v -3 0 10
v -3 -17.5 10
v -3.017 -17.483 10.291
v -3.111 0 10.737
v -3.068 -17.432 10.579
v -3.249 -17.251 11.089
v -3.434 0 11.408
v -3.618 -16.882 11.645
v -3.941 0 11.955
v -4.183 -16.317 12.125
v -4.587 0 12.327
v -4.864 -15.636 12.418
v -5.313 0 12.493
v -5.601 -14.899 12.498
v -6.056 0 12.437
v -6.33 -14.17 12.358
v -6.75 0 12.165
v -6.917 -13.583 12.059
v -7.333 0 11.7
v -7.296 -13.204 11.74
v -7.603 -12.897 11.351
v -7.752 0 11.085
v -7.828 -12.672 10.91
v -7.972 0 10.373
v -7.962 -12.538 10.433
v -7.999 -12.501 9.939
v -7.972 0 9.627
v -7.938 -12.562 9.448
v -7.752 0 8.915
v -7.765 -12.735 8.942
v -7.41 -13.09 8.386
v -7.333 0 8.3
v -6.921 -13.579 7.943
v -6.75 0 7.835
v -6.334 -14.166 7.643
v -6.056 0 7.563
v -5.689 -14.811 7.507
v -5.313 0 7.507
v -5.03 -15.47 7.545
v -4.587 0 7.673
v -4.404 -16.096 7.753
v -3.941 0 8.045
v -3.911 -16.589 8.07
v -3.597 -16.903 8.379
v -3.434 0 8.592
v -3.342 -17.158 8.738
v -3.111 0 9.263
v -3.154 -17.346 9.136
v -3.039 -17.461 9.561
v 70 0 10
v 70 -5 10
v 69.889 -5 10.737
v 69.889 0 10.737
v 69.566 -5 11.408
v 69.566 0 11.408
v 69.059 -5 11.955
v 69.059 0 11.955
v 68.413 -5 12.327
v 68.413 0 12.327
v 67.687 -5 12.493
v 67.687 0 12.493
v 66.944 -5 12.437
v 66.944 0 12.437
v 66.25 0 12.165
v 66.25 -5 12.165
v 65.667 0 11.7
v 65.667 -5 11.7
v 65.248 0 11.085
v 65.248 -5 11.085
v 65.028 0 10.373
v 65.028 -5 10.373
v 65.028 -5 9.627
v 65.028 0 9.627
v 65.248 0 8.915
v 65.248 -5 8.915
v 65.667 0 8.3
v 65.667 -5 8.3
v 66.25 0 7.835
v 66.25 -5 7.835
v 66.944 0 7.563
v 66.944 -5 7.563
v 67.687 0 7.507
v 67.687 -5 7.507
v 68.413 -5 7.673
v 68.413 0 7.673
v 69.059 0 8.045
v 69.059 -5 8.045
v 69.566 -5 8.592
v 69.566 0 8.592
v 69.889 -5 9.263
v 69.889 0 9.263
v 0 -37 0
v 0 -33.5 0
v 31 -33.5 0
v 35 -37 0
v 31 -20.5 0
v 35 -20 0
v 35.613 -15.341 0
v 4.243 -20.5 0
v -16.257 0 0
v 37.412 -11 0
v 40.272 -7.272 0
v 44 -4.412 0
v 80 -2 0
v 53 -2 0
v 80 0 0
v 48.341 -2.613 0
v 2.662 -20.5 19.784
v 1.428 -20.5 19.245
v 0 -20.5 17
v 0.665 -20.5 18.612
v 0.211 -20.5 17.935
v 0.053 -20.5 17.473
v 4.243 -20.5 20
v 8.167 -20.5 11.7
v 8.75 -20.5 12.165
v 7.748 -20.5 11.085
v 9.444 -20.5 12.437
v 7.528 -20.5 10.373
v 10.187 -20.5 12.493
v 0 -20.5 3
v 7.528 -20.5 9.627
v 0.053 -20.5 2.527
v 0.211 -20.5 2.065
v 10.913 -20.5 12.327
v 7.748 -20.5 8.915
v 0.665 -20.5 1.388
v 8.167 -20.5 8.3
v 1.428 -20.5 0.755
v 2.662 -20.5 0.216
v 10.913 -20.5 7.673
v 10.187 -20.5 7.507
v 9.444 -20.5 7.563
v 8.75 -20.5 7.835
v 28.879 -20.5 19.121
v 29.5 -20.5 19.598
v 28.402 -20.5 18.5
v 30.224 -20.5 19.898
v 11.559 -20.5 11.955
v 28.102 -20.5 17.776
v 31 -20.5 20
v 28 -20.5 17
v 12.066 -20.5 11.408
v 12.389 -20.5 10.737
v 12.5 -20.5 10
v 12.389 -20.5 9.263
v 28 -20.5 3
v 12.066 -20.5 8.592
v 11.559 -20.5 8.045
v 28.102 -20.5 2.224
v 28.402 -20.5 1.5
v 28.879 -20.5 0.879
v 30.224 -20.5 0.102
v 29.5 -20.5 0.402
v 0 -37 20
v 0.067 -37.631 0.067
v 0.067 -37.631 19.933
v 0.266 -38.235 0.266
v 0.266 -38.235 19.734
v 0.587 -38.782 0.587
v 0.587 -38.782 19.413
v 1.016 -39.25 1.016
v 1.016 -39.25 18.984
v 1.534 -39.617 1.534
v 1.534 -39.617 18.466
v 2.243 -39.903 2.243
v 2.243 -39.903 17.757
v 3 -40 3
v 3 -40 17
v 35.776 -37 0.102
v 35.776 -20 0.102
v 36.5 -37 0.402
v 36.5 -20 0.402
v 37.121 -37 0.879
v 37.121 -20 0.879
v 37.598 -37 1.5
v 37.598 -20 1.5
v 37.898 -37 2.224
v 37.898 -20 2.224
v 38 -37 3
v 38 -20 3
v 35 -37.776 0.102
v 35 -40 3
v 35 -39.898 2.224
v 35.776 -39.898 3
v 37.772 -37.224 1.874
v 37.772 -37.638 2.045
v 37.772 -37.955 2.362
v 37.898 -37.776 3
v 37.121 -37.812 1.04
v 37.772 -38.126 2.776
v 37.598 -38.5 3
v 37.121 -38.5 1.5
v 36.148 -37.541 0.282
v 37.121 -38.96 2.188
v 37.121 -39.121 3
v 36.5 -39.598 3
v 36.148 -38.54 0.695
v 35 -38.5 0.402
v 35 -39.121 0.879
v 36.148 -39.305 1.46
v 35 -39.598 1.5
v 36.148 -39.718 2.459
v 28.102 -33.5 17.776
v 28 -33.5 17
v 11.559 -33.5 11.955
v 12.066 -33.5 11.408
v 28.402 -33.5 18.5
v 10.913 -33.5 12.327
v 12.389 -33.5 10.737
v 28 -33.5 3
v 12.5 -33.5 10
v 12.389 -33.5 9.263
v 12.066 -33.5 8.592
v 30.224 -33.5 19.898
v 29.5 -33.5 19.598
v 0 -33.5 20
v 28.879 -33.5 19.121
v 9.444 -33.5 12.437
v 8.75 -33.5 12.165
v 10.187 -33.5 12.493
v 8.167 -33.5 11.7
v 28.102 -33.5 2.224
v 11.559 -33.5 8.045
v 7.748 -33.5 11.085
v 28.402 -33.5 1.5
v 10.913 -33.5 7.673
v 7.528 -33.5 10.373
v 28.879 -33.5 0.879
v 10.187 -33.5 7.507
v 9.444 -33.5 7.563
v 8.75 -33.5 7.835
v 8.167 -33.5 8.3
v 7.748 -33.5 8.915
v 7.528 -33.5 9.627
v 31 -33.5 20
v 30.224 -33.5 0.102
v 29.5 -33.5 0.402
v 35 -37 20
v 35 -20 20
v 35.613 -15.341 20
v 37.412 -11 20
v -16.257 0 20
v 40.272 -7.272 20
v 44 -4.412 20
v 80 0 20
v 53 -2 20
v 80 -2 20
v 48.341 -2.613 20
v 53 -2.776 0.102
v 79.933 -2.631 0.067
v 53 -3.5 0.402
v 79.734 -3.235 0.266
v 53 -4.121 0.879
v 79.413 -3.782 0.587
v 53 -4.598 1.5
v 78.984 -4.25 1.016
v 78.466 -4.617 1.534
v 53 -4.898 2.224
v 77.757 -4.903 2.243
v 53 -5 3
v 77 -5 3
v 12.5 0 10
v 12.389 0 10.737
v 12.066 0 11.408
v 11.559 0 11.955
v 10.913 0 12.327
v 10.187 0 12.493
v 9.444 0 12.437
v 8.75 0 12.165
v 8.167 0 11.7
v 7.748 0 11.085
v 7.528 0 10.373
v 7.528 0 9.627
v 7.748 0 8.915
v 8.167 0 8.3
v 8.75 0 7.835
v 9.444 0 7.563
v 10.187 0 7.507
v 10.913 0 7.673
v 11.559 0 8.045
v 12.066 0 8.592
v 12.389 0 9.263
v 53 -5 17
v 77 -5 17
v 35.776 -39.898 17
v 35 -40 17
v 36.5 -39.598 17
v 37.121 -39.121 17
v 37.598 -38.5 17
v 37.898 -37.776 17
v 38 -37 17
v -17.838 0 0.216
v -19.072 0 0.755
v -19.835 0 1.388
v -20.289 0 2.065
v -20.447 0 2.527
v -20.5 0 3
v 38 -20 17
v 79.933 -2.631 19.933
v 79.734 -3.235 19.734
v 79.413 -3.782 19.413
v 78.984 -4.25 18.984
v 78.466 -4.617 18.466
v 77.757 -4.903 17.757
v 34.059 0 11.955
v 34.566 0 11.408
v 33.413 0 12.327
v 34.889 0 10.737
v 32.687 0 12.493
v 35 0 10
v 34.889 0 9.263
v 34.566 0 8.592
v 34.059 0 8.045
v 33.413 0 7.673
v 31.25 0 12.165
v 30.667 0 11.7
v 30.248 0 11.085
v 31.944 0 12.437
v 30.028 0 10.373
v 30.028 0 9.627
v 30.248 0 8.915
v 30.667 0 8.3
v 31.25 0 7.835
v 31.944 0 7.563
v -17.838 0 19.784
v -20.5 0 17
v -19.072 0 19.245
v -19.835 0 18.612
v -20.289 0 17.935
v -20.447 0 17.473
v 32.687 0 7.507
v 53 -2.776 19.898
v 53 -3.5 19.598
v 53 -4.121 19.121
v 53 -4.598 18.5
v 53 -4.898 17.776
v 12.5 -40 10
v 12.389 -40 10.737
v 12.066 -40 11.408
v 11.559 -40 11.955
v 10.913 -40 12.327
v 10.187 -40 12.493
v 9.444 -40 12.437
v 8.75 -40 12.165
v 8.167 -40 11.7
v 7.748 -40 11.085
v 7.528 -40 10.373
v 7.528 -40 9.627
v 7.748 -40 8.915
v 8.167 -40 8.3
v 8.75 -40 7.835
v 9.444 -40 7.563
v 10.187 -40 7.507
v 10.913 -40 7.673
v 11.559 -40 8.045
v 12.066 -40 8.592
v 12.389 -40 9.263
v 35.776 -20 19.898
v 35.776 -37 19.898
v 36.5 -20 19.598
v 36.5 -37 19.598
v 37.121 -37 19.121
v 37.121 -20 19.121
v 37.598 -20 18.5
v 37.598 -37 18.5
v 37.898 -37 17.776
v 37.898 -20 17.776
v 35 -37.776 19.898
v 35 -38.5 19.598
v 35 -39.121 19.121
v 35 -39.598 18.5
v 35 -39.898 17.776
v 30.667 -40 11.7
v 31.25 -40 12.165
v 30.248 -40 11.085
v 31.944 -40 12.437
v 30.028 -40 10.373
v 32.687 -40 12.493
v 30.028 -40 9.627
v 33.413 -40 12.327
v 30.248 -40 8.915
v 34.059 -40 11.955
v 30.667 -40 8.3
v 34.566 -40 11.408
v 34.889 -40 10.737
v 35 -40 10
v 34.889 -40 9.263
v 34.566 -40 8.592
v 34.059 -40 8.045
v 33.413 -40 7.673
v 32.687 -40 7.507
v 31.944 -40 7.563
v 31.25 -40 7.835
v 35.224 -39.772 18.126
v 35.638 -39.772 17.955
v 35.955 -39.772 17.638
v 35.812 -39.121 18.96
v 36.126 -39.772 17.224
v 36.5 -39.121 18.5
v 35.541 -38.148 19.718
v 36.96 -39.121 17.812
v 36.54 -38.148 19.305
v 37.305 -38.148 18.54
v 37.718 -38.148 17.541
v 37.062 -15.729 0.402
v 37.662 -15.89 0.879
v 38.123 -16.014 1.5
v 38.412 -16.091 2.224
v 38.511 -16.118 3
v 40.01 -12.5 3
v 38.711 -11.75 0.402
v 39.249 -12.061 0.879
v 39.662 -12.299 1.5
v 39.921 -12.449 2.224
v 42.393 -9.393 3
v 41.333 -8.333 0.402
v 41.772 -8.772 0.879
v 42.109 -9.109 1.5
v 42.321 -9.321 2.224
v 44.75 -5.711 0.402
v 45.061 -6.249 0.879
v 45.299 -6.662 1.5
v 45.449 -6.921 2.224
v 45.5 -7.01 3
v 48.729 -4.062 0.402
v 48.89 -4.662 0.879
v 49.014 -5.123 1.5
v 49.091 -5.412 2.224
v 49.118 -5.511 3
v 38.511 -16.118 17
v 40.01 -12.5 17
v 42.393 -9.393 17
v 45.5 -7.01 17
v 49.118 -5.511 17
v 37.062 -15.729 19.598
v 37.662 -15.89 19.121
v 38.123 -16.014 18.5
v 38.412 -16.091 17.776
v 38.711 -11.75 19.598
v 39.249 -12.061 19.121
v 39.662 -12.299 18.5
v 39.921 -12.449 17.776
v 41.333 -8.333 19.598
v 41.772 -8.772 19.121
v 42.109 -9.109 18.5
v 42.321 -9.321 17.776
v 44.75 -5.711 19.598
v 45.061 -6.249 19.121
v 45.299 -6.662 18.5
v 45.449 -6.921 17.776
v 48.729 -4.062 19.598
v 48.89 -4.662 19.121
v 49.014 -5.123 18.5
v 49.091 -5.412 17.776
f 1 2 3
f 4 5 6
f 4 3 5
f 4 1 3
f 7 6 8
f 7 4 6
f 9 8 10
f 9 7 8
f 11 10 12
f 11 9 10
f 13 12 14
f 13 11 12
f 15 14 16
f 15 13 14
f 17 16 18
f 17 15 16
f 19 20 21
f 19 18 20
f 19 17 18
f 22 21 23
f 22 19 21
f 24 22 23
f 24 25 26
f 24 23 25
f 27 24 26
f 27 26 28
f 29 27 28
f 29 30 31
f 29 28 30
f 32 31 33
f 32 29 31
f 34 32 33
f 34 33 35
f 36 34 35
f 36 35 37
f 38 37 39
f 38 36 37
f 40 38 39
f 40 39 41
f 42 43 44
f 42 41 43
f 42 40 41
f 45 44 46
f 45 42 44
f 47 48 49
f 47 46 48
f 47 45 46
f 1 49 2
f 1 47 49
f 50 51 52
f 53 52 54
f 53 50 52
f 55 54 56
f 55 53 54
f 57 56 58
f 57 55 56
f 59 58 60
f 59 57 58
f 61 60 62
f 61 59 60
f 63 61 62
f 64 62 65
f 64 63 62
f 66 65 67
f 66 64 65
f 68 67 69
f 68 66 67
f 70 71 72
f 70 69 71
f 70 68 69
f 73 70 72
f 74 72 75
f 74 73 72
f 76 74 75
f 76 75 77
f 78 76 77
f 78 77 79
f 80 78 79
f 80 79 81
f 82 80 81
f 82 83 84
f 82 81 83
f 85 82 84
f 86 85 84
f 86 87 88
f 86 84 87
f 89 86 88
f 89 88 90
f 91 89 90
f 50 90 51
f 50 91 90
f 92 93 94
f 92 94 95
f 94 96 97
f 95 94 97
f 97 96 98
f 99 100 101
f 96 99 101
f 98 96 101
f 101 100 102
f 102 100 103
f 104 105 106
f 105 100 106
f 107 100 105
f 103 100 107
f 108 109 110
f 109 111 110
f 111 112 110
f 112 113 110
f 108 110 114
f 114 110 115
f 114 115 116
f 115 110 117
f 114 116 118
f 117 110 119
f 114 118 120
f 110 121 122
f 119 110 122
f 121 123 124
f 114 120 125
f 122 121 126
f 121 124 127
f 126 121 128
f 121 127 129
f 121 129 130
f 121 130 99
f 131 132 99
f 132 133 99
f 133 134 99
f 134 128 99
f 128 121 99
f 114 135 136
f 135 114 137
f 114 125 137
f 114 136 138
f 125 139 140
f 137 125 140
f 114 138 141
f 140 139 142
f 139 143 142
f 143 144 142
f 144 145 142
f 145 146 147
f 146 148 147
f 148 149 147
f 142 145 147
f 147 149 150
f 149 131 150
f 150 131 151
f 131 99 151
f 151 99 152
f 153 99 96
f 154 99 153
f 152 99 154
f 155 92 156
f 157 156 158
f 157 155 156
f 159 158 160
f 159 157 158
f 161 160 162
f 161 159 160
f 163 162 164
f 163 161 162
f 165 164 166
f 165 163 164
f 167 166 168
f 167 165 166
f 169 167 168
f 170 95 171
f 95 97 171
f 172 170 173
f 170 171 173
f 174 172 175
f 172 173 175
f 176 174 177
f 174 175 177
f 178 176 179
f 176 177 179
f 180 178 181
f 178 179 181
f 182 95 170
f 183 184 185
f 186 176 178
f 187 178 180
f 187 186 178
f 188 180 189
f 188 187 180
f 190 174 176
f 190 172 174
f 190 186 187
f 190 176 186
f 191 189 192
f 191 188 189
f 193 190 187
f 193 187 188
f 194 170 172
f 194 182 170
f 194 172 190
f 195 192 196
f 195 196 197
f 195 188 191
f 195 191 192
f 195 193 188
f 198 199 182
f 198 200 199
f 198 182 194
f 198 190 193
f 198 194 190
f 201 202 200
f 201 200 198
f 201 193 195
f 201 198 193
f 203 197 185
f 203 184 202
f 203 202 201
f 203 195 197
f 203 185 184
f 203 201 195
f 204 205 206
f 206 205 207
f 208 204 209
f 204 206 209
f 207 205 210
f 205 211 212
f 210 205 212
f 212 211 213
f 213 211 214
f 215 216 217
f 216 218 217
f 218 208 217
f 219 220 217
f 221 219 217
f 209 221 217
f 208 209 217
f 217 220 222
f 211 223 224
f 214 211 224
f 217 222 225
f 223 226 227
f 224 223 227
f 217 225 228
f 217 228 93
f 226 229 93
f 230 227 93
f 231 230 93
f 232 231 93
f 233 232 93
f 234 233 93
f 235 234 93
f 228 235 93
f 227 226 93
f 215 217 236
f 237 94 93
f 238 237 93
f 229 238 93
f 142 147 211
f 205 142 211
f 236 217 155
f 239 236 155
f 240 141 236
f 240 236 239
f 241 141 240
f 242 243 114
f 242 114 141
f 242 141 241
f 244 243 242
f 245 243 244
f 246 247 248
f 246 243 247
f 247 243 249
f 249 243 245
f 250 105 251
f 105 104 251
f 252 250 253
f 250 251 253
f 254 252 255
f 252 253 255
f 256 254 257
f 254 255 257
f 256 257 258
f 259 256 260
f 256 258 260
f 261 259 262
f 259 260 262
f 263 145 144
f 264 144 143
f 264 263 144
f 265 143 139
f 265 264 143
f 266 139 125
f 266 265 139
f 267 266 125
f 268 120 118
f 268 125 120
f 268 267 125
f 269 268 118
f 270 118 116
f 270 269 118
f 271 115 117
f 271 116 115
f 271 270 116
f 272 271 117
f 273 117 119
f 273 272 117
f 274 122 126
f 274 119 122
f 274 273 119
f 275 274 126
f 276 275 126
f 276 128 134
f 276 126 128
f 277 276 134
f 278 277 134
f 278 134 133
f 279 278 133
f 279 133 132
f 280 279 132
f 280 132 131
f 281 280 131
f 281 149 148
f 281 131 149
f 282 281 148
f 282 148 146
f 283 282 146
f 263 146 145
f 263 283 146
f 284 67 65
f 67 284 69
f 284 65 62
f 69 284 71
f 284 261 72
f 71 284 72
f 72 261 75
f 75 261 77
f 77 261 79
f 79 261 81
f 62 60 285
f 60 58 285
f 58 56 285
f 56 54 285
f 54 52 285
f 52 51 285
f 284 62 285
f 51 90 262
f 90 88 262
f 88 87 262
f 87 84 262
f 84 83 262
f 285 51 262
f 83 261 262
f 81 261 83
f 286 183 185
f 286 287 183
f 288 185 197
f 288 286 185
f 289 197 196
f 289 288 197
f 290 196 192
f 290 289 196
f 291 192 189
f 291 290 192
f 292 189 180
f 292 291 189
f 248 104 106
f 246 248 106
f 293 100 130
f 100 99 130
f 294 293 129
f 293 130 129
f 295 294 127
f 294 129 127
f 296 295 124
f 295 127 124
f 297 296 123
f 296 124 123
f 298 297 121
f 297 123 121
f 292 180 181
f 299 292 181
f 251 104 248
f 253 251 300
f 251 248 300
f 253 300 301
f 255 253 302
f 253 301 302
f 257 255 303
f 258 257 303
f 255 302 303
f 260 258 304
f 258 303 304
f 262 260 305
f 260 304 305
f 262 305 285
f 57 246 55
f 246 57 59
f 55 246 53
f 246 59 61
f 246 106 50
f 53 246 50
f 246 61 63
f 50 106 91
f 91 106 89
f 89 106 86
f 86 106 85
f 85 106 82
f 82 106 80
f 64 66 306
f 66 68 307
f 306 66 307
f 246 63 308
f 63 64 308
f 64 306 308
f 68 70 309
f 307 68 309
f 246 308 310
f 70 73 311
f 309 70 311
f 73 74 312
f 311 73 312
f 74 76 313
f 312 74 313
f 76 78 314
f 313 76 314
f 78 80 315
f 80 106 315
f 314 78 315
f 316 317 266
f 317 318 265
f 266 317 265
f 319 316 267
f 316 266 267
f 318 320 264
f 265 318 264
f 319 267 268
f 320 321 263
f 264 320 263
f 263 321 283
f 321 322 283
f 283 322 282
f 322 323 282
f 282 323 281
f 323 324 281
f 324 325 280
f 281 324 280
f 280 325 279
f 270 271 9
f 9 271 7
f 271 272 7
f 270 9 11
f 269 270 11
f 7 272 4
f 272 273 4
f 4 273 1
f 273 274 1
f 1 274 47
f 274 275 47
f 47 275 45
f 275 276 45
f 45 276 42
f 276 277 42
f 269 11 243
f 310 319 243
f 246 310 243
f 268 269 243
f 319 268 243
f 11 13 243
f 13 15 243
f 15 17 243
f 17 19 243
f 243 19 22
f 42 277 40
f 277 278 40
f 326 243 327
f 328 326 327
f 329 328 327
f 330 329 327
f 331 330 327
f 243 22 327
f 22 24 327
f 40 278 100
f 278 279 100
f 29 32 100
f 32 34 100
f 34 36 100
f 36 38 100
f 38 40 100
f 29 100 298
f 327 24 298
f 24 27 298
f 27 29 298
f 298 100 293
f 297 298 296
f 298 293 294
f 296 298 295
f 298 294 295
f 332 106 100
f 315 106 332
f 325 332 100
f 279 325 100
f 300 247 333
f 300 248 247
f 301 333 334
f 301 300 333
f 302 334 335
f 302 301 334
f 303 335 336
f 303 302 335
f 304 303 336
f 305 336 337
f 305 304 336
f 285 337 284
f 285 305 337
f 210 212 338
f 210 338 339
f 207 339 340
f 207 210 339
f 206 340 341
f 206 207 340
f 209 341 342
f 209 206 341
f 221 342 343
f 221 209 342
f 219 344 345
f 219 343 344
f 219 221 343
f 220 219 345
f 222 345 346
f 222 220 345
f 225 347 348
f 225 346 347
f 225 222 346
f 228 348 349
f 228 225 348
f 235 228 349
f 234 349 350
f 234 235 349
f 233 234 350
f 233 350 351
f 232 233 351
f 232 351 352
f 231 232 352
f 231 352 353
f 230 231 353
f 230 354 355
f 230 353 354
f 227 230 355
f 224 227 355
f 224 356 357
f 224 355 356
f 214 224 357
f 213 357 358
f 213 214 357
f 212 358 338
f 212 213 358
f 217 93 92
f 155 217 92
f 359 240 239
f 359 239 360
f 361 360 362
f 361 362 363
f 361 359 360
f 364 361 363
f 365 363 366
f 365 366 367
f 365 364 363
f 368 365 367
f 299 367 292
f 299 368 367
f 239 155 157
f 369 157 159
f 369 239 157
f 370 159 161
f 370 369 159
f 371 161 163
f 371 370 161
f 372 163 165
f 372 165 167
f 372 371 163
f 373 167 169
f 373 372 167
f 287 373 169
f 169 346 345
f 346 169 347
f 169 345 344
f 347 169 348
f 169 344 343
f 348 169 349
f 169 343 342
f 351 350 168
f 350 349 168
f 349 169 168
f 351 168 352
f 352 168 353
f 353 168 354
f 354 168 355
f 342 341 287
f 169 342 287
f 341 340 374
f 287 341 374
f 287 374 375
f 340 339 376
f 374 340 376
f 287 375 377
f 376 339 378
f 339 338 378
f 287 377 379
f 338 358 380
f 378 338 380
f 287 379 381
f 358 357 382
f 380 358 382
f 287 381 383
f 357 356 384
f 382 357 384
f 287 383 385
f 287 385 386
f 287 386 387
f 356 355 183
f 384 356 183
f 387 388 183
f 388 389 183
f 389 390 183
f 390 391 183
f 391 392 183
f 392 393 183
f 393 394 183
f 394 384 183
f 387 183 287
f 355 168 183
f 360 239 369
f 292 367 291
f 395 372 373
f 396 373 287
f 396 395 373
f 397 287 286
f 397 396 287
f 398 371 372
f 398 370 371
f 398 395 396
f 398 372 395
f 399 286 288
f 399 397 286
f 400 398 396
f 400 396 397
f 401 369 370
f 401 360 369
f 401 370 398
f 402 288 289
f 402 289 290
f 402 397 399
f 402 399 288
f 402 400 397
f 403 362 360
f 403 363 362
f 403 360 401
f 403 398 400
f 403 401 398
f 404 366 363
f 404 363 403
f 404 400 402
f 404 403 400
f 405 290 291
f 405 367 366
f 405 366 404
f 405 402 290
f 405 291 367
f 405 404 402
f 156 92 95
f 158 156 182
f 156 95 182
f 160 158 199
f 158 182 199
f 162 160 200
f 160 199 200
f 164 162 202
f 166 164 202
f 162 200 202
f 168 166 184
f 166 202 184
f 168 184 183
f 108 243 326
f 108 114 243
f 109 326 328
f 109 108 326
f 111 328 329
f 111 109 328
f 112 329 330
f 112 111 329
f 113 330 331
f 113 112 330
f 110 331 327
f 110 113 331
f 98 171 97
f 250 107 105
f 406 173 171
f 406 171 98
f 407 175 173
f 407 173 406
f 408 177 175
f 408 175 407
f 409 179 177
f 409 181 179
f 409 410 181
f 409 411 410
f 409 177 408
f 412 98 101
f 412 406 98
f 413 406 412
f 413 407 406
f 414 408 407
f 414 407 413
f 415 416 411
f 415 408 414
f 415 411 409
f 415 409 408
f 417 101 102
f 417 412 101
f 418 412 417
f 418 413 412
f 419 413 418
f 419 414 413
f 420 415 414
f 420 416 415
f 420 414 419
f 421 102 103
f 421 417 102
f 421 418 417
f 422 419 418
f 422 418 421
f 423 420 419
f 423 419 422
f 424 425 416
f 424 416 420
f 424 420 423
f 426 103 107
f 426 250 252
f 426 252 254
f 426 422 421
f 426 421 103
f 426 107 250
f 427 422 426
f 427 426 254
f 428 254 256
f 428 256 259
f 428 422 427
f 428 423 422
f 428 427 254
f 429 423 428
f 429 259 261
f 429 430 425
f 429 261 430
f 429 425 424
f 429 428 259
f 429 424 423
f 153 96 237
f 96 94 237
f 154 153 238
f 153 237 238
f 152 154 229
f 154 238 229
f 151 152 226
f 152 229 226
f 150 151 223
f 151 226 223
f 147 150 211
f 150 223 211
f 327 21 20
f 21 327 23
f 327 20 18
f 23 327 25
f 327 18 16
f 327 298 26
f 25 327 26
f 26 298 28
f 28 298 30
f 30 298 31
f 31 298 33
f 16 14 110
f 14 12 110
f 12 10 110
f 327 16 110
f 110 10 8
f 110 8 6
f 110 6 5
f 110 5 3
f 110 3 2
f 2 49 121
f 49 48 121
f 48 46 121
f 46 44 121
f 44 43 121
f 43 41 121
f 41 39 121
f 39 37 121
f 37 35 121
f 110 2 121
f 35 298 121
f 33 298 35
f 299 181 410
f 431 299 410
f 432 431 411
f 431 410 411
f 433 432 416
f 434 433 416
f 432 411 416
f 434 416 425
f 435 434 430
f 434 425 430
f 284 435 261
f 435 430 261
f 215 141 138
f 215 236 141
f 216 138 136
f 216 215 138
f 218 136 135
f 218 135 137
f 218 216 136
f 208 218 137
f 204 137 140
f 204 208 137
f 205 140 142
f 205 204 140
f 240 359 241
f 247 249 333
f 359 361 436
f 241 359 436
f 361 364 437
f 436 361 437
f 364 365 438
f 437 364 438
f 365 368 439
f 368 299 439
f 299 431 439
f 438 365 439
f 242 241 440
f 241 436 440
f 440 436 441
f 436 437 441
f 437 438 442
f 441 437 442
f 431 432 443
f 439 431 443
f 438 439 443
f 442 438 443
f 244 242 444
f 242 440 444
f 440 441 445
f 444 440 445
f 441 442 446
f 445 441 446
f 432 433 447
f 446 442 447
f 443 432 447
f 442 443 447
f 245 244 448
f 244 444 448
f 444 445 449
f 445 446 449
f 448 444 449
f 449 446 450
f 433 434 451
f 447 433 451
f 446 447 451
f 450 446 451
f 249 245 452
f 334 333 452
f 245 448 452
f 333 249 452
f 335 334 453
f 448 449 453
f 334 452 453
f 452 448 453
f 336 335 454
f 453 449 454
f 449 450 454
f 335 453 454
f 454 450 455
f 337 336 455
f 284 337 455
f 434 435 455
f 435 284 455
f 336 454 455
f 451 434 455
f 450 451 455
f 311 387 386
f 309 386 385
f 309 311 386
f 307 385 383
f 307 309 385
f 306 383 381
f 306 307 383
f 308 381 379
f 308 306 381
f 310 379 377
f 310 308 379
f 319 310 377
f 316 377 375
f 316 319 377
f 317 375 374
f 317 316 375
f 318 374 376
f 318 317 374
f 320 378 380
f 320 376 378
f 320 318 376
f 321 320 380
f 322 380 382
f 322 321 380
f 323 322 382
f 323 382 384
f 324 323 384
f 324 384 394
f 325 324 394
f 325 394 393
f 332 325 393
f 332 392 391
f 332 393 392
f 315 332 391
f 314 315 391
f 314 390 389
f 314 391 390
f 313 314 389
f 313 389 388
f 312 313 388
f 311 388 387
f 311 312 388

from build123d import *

# Parameters (mm, degrees)
F1_DEPTH = 20
F2_R     = 2.5
F3_DEPTH = 50
F4_R     = 2.99999


# Not quite as in the source:
# - a fillet or chamfer is up to 0.001 mm smaller than in the source, because OpenCascade refuses the exact size


with BuildPart() as f1:
    # F0 (on Top) → F1 (new body)
    with BuildSketch(Plane.XY):
        with BuildLine():
            Line((80, 0), (-20.5, 0))
            Line((-20.5, 0), (0, -20.5))
            Line((0, -20.5), (28, -20.5))
            Line((28, -20.5), (28, -33.5))
            Line((28, -33.5), (0, -33.5))
            Line((0, -33.5), (0, -40))
            Line((0, -40), (38, -40))
            Line((38, -40), (38, -20))
            ThreePointArc((38, -20), (42.3933982822, -9.3933982822), (53, -5))
            Line((53, -5), (80, -5))
            Line((80, -5), (80, 0))
        make_face()
    extrude(amount=F1_DEPTH)

    # F2 (on Front) → F3 (cut)
    with BuildSketch(Plane.XZ):
        with Locations((10, 10)):
            Circle(F2_R)
        with Locations((-5.5, 10)):
            Circle(F2_R)
        with Locations((32.5, 10)):
            Circle(F2_R)
        with Locations((67.5, 10)):
            Circle(F2_R)
    extrude(amount=F3_DEPTH, mode=Mode.SUBTRACT)

    # F4 (radius 3 in the source; OpenCascade refuses exactly that, so slightly less here)
    f4_edges = [f1.edges().sort_by_distance(p)[0] for p in [
        (66.5, -5, 20),
        (19, -40, 20),
        (0, -40, 10),
        (19, -40, 0),
        (66.5, -5, 0),
        (-10.25, -10.25, 20),
        (-10.25, -10.25, 0),
        (80, -5, 10),
        (38, -40, 10),
        (28, -27, 20),
        (28, -27, 0),
    ]]
    fillet(f4_edges, radius=F4_R)


solid = f1.part
